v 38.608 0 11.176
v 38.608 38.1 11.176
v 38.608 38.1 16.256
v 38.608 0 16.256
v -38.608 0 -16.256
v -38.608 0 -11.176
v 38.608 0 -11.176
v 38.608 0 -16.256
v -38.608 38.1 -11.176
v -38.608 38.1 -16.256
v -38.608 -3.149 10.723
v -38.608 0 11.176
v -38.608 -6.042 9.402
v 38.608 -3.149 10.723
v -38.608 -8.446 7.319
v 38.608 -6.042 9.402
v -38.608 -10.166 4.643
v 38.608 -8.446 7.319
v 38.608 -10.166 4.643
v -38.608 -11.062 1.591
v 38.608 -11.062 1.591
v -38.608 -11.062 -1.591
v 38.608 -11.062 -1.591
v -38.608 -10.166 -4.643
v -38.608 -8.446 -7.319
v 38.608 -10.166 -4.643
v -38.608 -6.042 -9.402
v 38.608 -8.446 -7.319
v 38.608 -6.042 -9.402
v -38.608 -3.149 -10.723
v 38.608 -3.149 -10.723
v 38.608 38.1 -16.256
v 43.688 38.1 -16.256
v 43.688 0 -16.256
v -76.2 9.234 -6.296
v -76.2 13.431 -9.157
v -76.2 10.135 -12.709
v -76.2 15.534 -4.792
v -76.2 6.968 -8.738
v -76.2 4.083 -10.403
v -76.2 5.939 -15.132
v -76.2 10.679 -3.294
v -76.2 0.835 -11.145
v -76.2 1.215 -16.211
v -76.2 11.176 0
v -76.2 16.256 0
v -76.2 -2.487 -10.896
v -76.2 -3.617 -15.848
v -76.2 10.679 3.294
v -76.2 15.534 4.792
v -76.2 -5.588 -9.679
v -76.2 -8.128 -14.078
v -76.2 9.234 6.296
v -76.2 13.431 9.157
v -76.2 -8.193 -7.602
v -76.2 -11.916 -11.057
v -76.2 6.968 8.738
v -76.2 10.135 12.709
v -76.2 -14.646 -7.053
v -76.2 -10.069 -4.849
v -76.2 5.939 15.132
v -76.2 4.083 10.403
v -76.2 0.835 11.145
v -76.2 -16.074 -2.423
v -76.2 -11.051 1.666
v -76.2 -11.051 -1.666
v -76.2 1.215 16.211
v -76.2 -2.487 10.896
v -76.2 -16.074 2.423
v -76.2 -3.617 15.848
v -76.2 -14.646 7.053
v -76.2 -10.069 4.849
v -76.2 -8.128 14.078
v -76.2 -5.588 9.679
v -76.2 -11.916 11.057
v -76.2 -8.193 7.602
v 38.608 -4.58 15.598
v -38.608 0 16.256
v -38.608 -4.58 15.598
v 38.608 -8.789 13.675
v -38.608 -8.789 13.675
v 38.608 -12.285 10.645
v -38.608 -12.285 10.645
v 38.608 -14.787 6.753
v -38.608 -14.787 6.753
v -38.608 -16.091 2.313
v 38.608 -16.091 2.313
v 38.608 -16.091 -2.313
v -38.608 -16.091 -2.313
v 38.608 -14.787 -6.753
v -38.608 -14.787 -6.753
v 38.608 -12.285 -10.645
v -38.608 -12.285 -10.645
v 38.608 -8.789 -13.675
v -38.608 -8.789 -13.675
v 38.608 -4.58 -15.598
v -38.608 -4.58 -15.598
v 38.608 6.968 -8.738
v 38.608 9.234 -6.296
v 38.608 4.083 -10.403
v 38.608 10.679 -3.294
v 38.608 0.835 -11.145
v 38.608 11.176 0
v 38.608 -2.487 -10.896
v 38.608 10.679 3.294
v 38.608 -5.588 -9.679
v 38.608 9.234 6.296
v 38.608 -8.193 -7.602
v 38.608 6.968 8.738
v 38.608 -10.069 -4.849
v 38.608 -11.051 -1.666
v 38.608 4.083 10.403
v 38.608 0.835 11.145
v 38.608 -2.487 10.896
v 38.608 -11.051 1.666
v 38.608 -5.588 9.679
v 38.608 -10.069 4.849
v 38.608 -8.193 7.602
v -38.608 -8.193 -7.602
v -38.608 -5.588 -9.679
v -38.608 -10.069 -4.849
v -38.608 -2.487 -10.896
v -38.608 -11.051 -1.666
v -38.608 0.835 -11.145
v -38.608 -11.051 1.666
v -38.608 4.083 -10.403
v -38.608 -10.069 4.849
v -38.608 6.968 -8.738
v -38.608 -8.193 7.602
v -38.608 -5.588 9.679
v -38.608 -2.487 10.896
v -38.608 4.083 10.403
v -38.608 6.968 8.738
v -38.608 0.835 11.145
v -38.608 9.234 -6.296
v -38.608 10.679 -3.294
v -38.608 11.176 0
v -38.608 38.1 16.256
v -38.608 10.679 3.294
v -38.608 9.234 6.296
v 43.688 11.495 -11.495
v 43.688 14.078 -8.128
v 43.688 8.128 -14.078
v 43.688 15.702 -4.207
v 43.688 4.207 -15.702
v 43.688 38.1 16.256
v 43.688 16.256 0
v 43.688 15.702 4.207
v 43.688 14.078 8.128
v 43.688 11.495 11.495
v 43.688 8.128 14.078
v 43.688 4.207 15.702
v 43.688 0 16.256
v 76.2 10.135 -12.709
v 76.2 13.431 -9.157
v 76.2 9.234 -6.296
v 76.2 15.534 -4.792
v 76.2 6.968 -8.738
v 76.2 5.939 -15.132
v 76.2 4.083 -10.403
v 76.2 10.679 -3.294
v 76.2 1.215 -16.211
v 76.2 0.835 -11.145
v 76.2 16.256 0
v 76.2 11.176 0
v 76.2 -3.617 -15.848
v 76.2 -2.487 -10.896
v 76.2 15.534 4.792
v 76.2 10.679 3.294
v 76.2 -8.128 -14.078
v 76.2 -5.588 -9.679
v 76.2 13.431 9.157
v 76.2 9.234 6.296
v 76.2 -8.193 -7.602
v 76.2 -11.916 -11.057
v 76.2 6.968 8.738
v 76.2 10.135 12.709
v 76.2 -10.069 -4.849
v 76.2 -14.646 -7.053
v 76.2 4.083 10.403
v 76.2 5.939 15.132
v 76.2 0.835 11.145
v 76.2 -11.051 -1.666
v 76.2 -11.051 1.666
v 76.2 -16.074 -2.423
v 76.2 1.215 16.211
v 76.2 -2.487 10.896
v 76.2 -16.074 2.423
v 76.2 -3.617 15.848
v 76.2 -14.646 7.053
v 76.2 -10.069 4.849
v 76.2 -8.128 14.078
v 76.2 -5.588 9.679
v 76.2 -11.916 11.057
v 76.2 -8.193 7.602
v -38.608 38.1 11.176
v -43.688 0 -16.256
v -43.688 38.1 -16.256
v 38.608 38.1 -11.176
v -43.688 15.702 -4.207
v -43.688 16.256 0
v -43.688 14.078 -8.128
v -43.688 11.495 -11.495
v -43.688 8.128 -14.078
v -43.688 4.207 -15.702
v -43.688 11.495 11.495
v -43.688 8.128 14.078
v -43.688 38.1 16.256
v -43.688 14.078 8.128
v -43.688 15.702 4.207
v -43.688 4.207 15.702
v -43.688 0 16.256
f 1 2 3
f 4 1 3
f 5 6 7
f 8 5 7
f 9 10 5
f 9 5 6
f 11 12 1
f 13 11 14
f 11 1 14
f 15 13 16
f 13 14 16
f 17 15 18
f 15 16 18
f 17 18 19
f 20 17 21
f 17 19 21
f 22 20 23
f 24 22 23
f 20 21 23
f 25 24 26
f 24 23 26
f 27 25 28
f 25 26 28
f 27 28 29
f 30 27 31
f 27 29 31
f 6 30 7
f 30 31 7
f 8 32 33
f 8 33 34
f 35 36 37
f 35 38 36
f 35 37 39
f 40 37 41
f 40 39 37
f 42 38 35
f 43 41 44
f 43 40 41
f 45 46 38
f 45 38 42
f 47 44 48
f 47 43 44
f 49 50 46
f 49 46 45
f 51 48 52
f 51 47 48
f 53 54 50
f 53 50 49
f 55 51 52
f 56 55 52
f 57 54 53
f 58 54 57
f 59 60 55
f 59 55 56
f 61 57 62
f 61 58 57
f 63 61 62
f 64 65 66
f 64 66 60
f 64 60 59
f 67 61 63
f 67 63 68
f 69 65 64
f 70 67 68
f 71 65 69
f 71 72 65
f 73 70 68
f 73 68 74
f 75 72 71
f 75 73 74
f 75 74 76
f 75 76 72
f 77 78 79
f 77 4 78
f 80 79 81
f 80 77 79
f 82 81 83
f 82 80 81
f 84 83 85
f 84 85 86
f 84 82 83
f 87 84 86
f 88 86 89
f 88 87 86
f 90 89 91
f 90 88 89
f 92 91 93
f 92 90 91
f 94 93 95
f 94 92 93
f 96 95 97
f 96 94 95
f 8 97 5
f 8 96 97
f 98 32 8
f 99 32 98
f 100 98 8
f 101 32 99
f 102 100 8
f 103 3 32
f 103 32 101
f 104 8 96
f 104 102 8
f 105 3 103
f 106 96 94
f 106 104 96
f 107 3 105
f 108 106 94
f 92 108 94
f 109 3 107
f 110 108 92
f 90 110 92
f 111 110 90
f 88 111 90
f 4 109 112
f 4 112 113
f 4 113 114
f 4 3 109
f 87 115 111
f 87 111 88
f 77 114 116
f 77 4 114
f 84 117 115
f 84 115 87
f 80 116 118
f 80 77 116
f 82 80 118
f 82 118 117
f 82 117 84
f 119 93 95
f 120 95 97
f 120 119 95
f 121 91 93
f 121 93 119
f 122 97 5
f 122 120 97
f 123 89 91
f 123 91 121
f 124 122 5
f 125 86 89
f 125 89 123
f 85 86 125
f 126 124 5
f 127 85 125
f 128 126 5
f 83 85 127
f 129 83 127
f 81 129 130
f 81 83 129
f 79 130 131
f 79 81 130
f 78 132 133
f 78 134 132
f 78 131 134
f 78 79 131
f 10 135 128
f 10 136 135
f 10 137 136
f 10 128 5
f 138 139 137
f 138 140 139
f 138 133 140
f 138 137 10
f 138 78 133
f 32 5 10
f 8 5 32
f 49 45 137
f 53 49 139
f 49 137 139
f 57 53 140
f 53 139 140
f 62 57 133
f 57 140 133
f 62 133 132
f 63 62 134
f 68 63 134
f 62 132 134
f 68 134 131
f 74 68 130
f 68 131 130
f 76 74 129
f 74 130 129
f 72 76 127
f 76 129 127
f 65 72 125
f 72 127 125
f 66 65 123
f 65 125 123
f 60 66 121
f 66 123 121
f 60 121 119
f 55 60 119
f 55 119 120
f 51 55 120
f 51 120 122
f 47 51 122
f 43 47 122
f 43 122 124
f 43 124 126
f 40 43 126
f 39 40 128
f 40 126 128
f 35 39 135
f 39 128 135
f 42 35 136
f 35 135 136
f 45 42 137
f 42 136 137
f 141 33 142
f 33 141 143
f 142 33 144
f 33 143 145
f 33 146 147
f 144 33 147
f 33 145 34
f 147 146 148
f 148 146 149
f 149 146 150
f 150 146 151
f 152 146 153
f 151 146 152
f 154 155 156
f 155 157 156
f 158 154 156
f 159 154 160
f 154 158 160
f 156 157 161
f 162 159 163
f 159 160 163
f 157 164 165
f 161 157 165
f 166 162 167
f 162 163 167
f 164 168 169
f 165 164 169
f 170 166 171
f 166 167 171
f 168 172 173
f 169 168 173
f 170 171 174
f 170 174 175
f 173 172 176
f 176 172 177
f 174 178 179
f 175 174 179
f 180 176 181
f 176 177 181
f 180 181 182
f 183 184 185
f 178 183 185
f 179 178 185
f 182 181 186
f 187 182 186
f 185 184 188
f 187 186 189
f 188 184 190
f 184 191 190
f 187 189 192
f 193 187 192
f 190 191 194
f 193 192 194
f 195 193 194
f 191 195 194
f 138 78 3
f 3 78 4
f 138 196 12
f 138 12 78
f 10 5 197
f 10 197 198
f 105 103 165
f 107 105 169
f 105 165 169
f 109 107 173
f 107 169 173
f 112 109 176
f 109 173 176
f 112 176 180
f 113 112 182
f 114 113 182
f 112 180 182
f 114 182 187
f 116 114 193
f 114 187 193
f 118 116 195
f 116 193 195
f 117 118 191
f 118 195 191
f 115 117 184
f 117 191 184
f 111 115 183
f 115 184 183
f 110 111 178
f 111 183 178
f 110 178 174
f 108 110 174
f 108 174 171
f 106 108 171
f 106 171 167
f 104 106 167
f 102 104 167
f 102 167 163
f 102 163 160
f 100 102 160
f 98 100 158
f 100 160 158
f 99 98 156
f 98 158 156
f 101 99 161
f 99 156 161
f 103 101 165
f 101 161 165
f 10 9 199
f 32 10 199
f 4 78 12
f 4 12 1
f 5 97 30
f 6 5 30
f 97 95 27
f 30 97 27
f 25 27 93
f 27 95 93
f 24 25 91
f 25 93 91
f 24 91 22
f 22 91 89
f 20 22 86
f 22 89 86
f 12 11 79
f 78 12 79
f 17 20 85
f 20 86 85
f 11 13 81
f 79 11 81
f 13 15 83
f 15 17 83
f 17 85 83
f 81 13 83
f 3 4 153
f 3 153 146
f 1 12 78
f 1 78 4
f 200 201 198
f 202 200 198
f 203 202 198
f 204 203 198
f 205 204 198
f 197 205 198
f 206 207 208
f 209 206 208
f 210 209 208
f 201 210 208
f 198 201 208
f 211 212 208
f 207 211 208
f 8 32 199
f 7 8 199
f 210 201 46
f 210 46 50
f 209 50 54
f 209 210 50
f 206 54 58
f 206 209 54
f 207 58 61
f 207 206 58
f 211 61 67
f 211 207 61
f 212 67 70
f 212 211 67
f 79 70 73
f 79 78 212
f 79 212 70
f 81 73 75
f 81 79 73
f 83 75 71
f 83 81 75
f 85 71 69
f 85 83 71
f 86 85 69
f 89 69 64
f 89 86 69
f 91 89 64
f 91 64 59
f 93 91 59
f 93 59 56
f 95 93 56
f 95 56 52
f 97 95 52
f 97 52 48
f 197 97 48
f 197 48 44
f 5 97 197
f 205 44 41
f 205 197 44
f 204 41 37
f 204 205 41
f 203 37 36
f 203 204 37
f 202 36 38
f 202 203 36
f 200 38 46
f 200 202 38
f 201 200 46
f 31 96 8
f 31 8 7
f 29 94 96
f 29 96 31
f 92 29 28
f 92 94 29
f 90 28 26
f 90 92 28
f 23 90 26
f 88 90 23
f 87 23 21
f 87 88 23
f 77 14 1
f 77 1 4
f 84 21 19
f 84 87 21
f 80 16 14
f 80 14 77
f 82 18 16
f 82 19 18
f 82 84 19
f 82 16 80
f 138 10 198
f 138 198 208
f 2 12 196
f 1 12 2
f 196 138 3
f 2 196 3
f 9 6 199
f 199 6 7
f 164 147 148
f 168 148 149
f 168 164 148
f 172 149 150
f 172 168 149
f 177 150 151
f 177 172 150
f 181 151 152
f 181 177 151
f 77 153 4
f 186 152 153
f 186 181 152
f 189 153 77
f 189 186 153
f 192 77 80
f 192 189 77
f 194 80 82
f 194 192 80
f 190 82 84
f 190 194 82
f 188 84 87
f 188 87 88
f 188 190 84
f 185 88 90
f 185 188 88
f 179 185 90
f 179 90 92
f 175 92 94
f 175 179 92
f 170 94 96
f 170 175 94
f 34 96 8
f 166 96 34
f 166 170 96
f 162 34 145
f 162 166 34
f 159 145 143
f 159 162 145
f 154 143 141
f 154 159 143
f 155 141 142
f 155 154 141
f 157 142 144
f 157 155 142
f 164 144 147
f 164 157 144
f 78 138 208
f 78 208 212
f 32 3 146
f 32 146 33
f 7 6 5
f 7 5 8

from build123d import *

# Parameters (mm, degrees)
F0_W          = 37.592
F0_H          = 5.08
F2_W          = 77.216
F2_H          = 5.08
F3_ANGLE_BACK = 90
F3_ANGLE      = 180
F4_W          = 77.216
F4_H          = 5.08
F5_DEPTH      = 38.1
F7_DEPTH      = 5.08
F9_DEPTH      = 5.08


with BuildPart() as f1:
    # F0 (on Top) → F1 (revolve)
    with BuildSketch(Plane.XY):
        with Locations((-57.404, 13.716)):
            Rectangle(F0_W, F0_H)
    revolve(axis=Axis((-4.8519736156, 0, 0), (1, 0, 0)))

    # F6 (on face) → F7 (join)
    with BuildSketch(Plane.YZ.offset(-38.608)):
        with BuildLine():
            Line((38.1, 16.256), (0, 16.256))
            ThreePointArc((0, 16.256), (11.494727835, 11.494727835), (16.256, 0))
            ThreePointArc((16.256, 0), (11.494727835, -11.494727835), (0, -16.256))
            Line((0, -16.256), (38.1, -16.256))
            Line((38.1, -16.256), (38.1, 16.256))
        make_face()
    extrude(amount=-F7_DEPTH)


with BuildPart() as f1b:
    # F0 (on Top) → F1, piece 2 (revolve)
    with BuildSketch(Plane.XY):
        with Locations((57.404, 13.716)):
            Rectangle(F0_W, F0_H)
    revolve(axis=Axis((-4.8519736156, 0, 0), (1, 0, 0)))

    # F8 (on face) → F9 (join)
    with BuildSketch(Plane(origin=(38.608, 0, 0), x_dir=(0, -1, 0), z_dir=(-1, 0, 0))):
        with BuildLine():
            ThreePointArc((0, -16.256), (-16.256, 0), (0, 16.256))
            Line((0, 16.256), (-38.1, 16.256))
            Line((-38.1, 16.256), (-38.1, -16.256))
            Line((-38.1, -16.256), (0, -16.256))
        make_face()
    extrude(amount=-F9_DEPTH)


with BuildPart() as f3:
    # F2 (on Top) → F3 (revolve)
    with BuildSketch(Plane.XY, mode=Mode.PRIVATE) as f3_sk:
        with Locations((0, -13.716)):
            Rectangle(F2_W, F2_H)
    revolve(f3_sk.sketch.rotate(Axis((-9.3715274706, 0, 0), (1, 0, 0)), -F3_ANGLE_BACK), axis=Axis((-9.3715274706, 0, 0), (1, 0, 0)), revolution_arc=F3_ANGLE)


with BuildPart() as f5:
    # F4 (on Front) → F5 (new body)
    with BuildSketch(Plane.XZ):
        with Locations((0, 13.716)):
            Rectangle(F4_W, F4_H)
    extrude(amount=-F5_DEPTH)


with BuildPart() as f5b:
    # F4 (on Front) → F5, piece 2 (new body)
    with BuildSketch(Plane.XZ):
        with Locations((0, -13.716)):
            Rectangle(F4_W, F4_H)
    extrude(amount=-F5_DEPTH)


solid = Compound([f1.part, f1b.part, f3.part, f5.part, f5b.part])
